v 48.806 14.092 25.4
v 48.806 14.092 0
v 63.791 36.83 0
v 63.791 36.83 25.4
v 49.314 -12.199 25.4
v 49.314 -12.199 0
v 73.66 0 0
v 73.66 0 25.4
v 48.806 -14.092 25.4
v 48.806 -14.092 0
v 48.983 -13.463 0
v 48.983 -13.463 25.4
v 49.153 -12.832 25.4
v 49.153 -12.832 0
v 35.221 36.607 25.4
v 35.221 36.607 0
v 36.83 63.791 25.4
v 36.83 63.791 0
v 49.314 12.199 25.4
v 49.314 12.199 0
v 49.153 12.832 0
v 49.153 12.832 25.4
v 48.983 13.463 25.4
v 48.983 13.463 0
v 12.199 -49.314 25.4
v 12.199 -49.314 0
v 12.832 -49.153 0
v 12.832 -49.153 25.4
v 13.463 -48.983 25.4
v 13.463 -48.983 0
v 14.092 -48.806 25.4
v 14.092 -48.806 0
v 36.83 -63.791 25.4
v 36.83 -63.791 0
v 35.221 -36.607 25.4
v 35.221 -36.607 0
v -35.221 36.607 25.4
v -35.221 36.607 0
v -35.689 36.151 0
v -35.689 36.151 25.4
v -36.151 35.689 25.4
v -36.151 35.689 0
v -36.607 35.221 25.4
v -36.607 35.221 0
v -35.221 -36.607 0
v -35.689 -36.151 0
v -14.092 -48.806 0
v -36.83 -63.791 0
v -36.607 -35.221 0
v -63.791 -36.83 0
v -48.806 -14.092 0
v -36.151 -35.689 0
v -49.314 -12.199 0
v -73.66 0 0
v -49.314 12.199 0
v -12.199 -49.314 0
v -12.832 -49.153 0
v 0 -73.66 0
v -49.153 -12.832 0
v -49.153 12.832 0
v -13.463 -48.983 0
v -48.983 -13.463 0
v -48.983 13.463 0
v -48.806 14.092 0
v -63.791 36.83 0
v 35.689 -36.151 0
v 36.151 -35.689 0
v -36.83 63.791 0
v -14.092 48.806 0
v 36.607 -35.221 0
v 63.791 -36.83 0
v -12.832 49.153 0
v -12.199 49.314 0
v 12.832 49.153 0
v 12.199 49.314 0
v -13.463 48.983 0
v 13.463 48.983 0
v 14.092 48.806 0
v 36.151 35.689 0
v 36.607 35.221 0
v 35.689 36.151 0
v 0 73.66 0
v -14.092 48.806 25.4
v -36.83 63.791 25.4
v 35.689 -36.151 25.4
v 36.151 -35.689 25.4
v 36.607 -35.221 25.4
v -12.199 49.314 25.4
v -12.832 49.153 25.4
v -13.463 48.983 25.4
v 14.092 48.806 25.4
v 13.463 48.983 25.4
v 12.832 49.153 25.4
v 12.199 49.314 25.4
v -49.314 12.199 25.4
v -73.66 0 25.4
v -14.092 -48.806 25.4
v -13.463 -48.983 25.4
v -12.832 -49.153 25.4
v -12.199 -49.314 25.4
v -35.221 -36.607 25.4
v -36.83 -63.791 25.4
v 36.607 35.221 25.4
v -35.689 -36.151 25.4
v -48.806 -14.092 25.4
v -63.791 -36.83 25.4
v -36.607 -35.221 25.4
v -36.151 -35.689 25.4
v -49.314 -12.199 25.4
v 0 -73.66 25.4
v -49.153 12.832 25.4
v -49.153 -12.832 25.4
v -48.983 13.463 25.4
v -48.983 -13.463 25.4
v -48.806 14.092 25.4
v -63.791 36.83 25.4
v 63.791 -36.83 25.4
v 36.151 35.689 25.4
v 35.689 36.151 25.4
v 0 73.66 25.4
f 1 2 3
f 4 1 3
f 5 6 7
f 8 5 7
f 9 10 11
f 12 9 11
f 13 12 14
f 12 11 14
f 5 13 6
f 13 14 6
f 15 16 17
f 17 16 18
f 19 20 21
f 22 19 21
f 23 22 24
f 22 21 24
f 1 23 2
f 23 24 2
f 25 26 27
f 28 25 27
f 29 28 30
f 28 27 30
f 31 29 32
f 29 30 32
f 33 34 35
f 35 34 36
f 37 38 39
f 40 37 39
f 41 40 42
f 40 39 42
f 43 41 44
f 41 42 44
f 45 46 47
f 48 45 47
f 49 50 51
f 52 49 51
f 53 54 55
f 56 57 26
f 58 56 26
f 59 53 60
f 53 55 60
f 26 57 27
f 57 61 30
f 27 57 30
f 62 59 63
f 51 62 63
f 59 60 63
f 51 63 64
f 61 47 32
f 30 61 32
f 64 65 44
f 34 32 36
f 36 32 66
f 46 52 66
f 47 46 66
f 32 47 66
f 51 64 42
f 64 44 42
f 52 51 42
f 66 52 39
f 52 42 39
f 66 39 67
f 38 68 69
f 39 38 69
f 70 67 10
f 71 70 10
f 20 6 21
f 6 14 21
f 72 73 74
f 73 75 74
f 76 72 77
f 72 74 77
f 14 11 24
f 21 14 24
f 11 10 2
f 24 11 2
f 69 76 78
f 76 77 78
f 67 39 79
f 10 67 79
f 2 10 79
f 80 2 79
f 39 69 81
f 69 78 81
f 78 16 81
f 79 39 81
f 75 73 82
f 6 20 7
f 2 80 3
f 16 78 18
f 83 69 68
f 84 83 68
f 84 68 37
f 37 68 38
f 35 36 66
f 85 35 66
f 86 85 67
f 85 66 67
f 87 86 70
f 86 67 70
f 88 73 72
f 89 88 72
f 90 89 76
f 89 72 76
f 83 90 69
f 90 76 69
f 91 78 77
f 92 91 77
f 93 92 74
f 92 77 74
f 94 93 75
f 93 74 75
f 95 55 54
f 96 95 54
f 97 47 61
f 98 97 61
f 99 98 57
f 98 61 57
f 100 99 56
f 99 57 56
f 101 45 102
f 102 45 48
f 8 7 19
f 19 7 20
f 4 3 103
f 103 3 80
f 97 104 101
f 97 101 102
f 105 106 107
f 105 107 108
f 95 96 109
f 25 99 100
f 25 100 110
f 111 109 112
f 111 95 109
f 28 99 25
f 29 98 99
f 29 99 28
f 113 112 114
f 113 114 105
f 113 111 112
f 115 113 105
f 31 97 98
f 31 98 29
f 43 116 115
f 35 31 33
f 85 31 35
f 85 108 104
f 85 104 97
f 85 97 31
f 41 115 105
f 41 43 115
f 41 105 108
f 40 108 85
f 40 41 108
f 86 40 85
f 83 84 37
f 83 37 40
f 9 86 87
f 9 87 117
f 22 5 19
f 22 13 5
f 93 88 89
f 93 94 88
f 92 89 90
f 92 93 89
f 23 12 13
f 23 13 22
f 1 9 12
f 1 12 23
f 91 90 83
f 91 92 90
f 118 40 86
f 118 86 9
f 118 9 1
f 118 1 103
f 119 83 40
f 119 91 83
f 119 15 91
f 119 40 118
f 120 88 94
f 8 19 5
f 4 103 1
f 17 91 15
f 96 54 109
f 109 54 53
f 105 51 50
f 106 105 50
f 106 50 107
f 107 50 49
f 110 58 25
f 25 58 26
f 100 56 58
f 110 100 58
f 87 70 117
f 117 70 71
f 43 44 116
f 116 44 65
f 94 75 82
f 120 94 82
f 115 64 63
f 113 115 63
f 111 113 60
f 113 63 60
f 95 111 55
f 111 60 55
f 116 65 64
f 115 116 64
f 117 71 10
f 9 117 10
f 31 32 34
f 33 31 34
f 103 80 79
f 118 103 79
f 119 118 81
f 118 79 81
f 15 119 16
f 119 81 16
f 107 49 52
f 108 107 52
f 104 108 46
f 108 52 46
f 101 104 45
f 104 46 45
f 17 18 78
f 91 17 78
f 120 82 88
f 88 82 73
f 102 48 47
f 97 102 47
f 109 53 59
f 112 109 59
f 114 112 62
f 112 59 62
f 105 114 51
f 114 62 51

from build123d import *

# Parameters (mm, degrees)
F1_DEPTH = 25.4


with BuildPart() as f1:
    # F0 (on Top) → F1 (new body)
    with BuildSketch(Plane.XY):
        with BuildLine():
            ThreePointArc((49.313544, -12.198952), (50.427017, -6.144591), (50.8, 0))
            ThreePointArc((50.8, 0), (50.427017, 6.144591), (49.313544, 12.198952))
            ThreePointArc((49.313544, 12.198952), (49.069032, 13.148007), (48.806257, 14.09217))
            ThreePointArc((48.806257, 14.09217), (43.994091, 25.4), (36.607305, 35.221374))
            ThreePointArc((36.607305, 35.221374), (35.921024, 35.921024), (35.221374, 36.607305))
            ThreePointArc((35.221374, 36.607305), (25.4, 43.994091), (14.09217, 48.806257))
            ThreePointArc((14.09217, 48.806257), (13.148007, 49.069032), (12.198952, 49.313544))
            ThreePointArc((12.198952, 49.313544), (0, 50.8), (-12.198952, 49.313544))
            ThreePointArc((-12.198952, 49.313544), (-13.148007, 49.069032), (-14.09217, 48.806257))
            ThreePointArc((-14.09217, 48.806257), (-25.4, 43.994091), (-35.221374, 36.607305))
            ThreePointArc((-35.221374, 36.607305), (-35.921024, 35.921024), (-36.607305, 35.221374))
            ThreePointArc((-36.607305, 35.221374), (-43.994091, 25.4), (-48.806257, 14.09217))
            ThreePointArc((-48.806257, 14.09217), (-49.069032, 13.148007), (-49.313544, 12.198952))
            ThreePointArc((-49.313544, 12.198952), (-50.8, 0), (-49.313544, -12.198952))
            ThreePointArc((-49.313544, -12.198952), (-49.069032, -13.148007), (-48.806257, -14.09217))
            ThreePointArc((-48.806257, -14.09217), (-43.994091, -25.4), (-36.607305, -35.221374))
            ThreePointArc((-36.607305, -35.221374), (-35.921024, -35.921024), (-35.221374, -36.607305))
            ThreePointArc((-35.221374, -36.607305), (-25.4, -43.994091), (-14.09217, -48.806257))
            ThreePointArc((-14.09217, -48.806257), (-13.148007, -49.069032), (-12.198952, -49.313544))
            ThreePointArc((-12.198952, -49.313544), (0, -50.8), (12.198952, -49.313544))
            ThreePointArc((12.198952, -49.313544), (13.148007, -49.069032), (14.09217, -48.806257))
            ThreePointArc((14.09217, -48.806257), (25.4, -43.994091), (35.221374, -36.607305))
            ThreePointArc((35.221374, -36.607305), (35.921024, -35.921024), (36.607305, -35.221374))
            ThreePointArc((36.607305, -35.221374), (43.994091, -25.4), (48.806257, -14.09217))
            ThreePointArc((48.806257, -14.09217), (49.069032, -13.148007), (49.313544, -12.198952))
        make_face()
        with BuildLine():
            ThreePointArc((49.313544, 12.198952), (50.427017, 6.144591), (50.8, 0))
            ThreePointArc((50.8, 0), (50.427017, -6.144591), (49.313544, -12.198952))
            Line((49.313544, -12.198952), (73.66, 0))
            Line((73.66, 0), (49.313544, 12.198952))
        make_face()
        with BuildLine():
            ThreePointArc((36.607305, 35.221374), (43.994091, 25.4), (48.806257, 14.09217))
            Line((48.806257, 14.09217), (63.791431, 36.83))
            Line((63.791431, 36.83), (36.607305, 35.221374))
        make_face()
        with BuildLine():
            Line((63.791431, -36.83), (48.806257, -14.09217))
            ThreePointArc((48.806257, -14.09217), (43.994091, -25.4), (36.607305, -35.221374))
            Line((36.607305, -35.221374), (63.791431, -36.83))
        make_face()
        with BuildLine():
            ThreePointArc((14.09217, 48.806257), (25.4, 43.994091), (35.221374, 36.607305))
            Line((35.221374, 36.607305), (36.83, 63.791431))
            Line((36.83, 63.791431), (14.09217, 48.806257))
        make_face()
        with BuildLine():
            Line((36.83, -63.791431), (35.221374, -36.607305))
            ThreePointArc((35.221374, -36.607305), (25.4, -43.994091), (14.09217, -48.806257))
            Line((14.09217, -48.806257), (36.83, -63.791431))
        make_face()
        with BuildLine():
            ThreePointArc((-12.198952, 49.313544), (0, 50.8), (12.198952, 49.313544))
            Line((12.198952, 49.313544), (0, 73.66))
            Line((0, 73.66), (-12.198952, 49.313544))
        make_face()
        with BuildLine():
            Line((0, -73.66), (12.198952, -49.313544))
            ThreePointArc((12.198952, -49.313544), (0, -50.8), (-12.198952, -49.313544))
            Line((-12.198952, -49.313544), (0, -73.66))
        make_face()
        with BuildLine():
            ThreePointArc((-35.221374, 36.607305), (-25.4, 43.994091), (-14.09217, 48.806257))
            Line((-14.09217, 48.806257), (-36.83, 63.791431))
            Line((-36.83, 63.791431), (-35.221374, 36.607305))
        make_face()
        with BuildLine():
            Line((-36.83, -63.791431), (-14.09217, -48.806257))
            ThreePointArc((-14.09217, -48.806257), (-25.4, -43.994091), (-35.221374, -36.607305))
            Line((-35.221374, -36.607305), (-36.83, -63.791431))
        make_face()
        with BuildLine():
            ThreePointArc((-48.806257, 14.09217), (-43.994091, 25.4), (-36.607305, 35.221374))
            Line((-36.607305, 35.221374), (-63.791431, 36.83))
            Line((-63.791431, 36.83), (-48.806257, 14.09217))
        make_face()
        with BuildLine():
            Line((-63.791431, -36.83), (-36.607305, -35.221374))
            ThreePointArc((-36.607305, -35.221374), (-43.994091, -25.4), (-48.806257, -14.09217))
            Line((-48.806257, -14.09217), (-63.791431, -36.83))
        make_face()
        with BuildLine():
            ThreePointArc((-49.313544, -12.198952), (-50.8, 0), (-49.313544, 12.198952))
            Line((-49.313544, 12.198952), (-73.66, 0))
            Line((-73.66, 0), (-49.313544, -12.198952))
        make_face()
    extrude(amount=F1_DEPTH)


solid = f1.part
